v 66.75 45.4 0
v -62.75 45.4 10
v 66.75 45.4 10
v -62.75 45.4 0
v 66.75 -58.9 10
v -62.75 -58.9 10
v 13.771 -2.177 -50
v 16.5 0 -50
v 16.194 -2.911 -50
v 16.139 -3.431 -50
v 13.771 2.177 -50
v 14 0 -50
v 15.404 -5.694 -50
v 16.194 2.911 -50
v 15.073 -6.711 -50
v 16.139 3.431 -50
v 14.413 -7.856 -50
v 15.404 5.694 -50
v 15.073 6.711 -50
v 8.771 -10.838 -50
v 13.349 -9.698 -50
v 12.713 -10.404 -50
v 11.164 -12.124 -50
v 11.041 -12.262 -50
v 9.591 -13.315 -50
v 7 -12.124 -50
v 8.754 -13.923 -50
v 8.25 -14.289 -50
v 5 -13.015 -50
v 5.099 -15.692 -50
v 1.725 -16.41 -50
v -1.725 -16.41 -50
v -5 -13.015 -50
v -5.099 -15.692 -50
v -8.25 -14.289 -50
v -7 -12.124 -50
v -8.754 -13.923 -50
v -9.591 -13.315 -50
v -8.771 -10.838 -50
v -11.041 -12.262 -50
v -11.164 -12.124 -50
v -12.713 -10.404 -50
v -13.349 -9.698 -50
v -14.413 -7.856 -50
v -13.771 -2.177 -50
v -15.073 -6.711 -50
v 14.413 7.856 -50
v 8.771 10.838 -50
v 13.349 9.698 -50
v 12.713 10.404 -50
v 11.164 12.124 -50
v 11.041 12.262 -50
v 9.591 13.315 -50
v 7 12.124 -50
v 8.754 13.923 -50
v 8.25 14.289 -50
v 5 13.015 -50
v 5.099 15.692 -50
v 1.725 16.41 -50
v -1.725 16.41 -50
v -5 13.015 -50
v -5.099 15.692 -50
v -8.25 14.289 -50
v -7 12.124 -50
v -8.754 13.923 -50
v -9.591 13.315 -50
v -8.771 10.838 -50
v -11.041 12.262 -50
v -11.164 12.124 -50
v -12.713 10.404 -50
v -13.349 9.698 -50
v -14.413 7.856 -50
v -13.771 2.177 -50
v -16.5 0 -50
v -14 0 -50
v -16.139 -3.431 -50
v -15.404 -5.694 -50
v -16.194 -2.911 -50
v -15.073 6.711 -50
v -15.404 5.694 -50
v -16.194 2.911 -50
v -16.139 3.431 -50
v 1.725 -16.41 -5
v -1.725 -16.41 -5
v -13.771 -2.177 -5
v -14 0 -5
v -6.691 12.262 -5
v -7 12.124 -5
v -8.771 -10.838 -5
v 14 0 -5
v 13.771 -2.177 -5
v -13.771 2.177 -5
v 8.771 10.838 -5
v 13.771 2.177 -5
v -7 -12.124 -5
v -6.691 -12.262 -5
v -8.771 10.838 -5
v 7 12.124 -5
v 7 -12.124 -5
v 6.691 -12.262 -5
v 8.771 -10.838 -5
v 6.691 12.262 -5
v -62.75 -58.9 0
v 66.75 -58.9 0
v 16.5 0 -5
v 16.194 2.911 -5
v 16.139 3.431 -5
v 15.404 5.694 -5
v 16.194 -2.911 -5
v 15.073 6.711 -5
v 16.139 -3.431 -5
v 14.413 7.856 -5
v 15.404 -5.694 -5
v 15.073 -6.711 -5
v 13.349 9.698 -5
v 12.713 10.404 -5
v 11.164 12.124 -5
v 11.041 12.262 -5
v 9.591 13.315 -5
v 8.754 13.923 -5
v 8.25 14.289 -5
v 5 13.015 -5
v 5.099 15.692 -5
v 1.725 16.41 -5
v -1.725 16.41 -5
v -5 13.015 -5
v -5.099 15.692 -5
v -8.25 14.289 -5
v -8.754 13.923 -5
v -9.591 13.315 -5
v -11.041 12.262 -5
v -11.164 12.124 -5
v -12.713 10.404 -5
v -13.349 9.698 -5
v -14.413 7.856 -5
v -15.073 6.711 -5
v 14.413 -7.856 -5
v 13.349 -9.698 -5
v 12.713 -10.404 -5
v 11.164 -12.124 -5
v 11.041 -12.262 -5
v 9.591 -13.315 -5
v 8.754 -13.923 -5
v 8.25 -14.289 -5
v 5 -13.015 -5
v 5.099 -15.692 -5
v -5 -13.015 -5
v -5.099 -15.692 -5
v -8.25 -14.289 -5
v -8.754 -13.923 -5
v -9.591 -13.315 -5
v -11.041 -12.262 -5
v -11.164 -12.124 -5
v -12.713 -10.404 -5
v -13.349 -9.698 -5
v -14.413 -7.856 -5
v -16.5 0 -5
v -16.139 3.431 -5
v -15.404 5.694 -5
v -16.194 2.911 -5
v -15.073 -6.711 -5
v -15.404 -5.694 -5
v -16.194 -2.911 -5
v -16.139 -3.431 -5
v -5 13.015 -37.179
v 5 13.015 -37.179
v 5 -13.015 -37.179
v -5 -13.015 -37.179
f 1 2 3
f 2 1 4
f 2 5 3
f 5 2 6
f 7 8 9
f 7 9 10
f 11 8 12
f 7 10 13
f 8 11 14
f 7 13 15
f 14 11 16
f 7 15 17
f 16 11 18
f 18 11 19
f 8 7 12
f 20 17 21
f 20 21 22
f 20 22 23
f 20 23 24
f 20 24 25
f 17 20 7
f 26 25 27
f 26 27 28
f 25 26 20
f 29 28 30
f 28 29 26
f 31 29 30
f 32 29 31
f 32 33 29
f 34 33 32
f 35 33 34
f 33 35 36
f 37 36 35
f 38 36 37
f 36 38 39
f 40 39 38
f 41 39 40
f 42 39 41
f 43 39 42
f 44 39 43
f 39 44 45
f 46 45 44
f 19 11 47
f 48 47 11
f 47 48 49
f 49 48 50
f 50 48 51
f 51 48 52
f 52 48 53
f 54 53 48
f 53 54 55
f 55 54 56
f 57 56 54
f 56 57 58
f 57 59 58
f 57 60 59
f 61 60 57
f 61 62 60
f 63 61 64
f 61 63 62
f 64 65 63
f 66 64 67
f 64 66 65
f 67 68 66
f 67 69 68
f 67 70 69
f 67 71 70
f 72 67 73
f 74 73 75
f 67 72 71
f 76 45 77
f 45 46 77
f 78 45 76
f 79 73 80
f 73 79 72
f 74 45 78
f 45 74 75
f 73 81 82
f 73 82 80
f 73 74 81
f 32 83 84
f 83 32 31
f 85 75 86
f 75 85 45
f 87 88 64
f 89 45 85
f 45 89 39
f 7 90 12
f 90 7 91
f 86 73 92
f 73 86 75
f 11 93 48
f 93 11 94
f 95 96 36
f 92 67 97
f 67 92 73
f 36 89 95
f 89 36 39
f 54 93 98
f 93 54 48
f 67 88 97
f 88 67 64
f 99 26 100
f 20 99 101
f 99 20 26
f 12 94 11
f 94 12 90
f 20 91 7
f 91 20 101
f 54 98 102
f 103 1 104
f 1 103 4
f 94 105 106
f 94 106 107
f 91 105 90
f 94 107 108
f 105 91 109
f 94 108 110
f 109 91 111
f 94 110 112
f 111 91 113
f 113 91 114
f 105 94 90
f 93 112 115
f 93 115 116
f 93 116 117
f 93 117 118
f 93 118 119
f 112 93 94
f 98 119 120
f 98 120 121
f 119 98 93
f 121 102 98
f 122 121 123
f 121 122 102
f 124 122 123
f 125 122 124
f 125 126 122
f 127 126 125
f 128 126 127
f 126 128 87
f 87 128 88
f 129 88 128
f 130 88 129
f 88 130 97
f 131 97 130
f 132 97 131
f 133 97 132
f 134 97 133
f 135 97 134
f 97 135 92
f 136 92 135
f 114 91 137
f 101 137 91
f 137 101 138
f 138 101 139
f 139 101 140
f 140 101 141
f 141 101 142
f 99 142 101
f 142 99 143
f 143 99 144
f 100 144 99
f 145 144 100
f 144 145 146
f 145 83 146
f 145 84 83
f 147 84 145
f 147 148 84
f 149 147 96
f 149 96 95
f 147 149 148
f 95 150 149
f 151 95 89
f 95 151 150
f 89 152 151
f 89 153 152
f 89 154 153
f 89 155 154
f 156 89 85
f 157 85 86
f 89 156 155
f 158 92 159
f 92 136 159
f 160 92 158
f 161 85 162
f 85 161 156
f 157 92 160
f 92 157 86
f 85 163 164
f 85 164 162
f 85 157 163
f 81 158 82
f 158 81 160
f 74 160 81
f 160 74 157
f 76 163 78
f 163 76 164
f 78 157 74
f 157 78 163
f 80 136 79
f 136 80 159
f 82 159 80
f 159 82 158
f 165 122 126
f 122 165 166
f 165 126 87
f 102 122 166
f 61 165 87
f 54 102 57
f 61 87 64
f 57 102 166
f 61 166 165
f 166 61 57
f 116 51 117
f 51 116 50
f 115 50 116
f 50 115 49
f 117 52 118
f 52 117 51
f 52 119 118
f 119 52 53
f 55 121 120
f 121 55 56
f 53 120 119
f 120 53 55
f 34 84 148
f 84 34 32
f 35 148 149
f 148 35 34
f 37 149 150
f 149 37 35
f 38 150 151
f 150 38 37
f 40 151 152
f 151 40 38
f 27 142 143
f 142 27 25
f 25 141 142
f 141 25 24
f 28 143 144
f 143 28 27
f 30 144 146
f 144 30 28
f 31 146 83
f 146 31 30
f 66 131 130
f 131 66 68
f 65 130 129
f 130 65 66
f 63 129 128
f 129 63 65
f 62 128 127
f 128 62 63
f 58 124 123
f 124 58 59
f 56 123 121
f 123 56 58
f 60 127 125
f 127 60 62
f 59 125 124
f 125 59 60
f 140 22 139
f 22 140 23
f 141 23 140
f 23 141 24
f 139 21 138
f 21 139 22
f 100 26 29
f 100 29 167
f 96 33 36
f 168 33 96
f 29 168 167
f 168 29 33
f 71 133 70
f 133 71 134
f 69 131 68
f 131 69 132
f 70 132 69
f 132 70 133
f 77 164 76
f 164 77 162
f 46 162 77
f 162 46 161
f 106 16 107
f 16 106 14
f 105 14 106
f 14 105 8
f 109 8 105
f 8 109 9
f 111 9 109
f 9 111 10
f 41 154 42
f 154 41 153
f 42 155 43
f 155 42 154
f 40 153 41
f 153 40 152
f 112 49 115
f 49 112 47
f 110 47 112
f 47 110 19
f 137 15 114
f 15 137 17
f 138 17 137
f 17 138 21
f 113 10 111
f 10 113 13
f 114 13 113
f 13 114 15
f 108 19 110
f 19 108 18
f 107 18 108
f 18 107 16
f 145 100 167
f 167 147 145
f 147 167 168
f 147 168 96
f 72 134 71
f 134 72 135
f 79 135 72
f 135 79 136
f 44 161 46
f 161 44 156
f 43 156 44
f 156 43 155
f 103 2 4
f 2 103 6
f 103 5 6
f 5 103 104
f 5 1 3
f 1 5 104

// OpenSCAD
width  = 185;
height = 149;
module spinner() {
    union() {
        translate([2,-6.75,65])
            difference() {
                scale([0.7,0.7,0.5])
                    translate([-width/2,-height/2,-130])
                        cube([width,height,20]);
                    scale([0.7,0.7,1])
                        surface(file="image.png", center=true, invert=true, convexity=2);
            }
        translate([0,0,0])
            cylinder(h=10, r=40, center=true);
        translate([0,0,-25])
            difference() {
                cylinder(h=50, r=33/2, center=true);
                cylinder(h=50, r=28/2, center=true);
            }
    }
}

//////////////////////////////////////////////////////////////////////////
//////////////////////////////////////////////////////////////////////////

// The add_fillets module will either auto fillet the whole model or
// a section of the model depending on if ther are one or two children.
// 1 child:       Fillet the whole model
// Two children:  Fillet the first child in the area that is
//                 intersected by the second child 
module add_fillets(R=1,OB=1000,axis="xyz",fn=10)
{
    fn_even = ceil(fn/2)*2;
    if ($children==1)
    {
        minkowski_fillets(R=R,OB=OB,axis=axis,fn=fn_even)
        {
            children(0);
        }
    }
    if ($children==2)
    {
        union()
        {
            minkowski_fillets(R=R,OB=OB,axis=axis,fn=fn_even)
            {
                intersection()
                {
                    children(0);
                    children(1);
                }
            }
            difference()
            {
                children(0);
                children(1);
            }
        }
    }
}


// The add_rounds module will either auto round the whole model or
// a section of the model depending on if ther are one or two children.
// 1 child:       Round the whole model
// Two children:  Round the first child in the area that is
//                  intersected by the second child 
module add_rounds(R=1,OB=1000,axis="xyz",fn=10)
{
    fn_even = ceil(fn/2)*2;
    if ($children==1)
    {
        minkowski_rounds(R=R,OB=OB,axis=axis,fn=fn_even)
        {
            children(0);
        }
    }
    if ($children==2)
    {
        union()
        {
            minkowski_rounds(R=R,OB=OB,axis=axis,fn=fn_even)
            {
                intersection()
                {
                    children(0);
                    minkowski()
                    {
                        children(1);
                        if (axis=="x")   rotate([0 ,90,0]) cylinder(r=R,$fn=fn_even,center=true);
                        if (axis=="y")   rotate([90,0 ,0]) cylinder(r=R,$fn=fn_even,center=true);
                        if (axis=="z")   rotate([0 ,0 ,0]) cylinder(r=R,$fn=fn_even,center=true);
                        if (axis=="xyz") sphere(r=R,$fn=fn_even);
                    }
                }
            }
            difference()
            {
                children(0);
                children(1);
            }
        }
    }
}




module minkowski_fillets(R=1,OB=1000,axis="xyz",fn=10)
{
    OBplus=OB+4*R;
    fn_even = ceil(fn/2)*2;
    echo(fn_even);
    difference()
    {
        cube([OB,OB,OB],center=true);
        minkowski()
        {   
            difference()
            {
                cube([OBplus,OBplus,OBplus],center=true);
                minkowski()
                {
                    children(0);
                    if (axis=="x")   rotate([0 ,90,0]) cylinder(r=R,$fn=fn_even,center=true);
                    if (axis=="y")   rotate([90,0 ,0]) cylinder(r=R,$fn=fn_even,center=true);
                    if (axis=="z")   rotate([0 ,0 ,0]) cylinder(r=R,$fn=fn_even,center=true);
                    if (axis=="xyz") sphere(r=R,$fn=fn);
                }
            }
            if (axis=="x")   rotate([0 ,90,0]) cylinder(r=R,$fn=fn_even,center=true);
            if (axis=="y")   rotate([90,0 ,0]) cylinder(r=R,$fn=fn_even,center=true);
            if (axis=="z")   rotate([0 ,0 ,0]) cylinder(r=R,$fn=fn_even,center=true);
            if (axis=="xyz") sphere(r=R,$fn=fn_even);
        }
    }
}


module minkowski_rounds(R=1,OB=1000,axis="xyz",fn=10)
{
    OBplus=OB+4*R;
    fn_even = ceil(fn/2)*2;
    minkowski()
    {  
        difference()
        {
            cube([OB,OB,OB],center=true);
            minkowski()
            {
                difference()
                {
                    cube([OBplus,OBplus,OBplus],center=true);
                    children(0);
                }
                if (axis=="x")   rotate([0 ,90,0]) cylinder(r=R,$fn=fn_even,center=true);
                if (axis=="y")   rotate([90,0 ,0]) cylinder(r=R,$fn=fn_even,center=true);
                if (axis=="z")   rotate([0 ,0 ,0]) cylinder(r=R,$fn=fn_even,center=true);
                if (axis=="xyz") sphere(r=R,$fn=fn_even);
            }
        }
        if (axis=="x")   rotate([0 ,90,0]) cylinder(r=R,$fn=fn,center=true);
        if (axis=="y")   rotate([90,0 ,0]) cylinder(r=R,$fn=fn,center=true);
        if (axis=="z")   rotate([0 ,0 ,0]) cylinder(r=R,$fn=fn,center=true);
        if (axis=="xyz") sphere(r=R,$fn=fn_even);      
    }
}

//
//
//

add_fillets(R=10,OB=1000,axis="z",fn=6)
    spinner();
